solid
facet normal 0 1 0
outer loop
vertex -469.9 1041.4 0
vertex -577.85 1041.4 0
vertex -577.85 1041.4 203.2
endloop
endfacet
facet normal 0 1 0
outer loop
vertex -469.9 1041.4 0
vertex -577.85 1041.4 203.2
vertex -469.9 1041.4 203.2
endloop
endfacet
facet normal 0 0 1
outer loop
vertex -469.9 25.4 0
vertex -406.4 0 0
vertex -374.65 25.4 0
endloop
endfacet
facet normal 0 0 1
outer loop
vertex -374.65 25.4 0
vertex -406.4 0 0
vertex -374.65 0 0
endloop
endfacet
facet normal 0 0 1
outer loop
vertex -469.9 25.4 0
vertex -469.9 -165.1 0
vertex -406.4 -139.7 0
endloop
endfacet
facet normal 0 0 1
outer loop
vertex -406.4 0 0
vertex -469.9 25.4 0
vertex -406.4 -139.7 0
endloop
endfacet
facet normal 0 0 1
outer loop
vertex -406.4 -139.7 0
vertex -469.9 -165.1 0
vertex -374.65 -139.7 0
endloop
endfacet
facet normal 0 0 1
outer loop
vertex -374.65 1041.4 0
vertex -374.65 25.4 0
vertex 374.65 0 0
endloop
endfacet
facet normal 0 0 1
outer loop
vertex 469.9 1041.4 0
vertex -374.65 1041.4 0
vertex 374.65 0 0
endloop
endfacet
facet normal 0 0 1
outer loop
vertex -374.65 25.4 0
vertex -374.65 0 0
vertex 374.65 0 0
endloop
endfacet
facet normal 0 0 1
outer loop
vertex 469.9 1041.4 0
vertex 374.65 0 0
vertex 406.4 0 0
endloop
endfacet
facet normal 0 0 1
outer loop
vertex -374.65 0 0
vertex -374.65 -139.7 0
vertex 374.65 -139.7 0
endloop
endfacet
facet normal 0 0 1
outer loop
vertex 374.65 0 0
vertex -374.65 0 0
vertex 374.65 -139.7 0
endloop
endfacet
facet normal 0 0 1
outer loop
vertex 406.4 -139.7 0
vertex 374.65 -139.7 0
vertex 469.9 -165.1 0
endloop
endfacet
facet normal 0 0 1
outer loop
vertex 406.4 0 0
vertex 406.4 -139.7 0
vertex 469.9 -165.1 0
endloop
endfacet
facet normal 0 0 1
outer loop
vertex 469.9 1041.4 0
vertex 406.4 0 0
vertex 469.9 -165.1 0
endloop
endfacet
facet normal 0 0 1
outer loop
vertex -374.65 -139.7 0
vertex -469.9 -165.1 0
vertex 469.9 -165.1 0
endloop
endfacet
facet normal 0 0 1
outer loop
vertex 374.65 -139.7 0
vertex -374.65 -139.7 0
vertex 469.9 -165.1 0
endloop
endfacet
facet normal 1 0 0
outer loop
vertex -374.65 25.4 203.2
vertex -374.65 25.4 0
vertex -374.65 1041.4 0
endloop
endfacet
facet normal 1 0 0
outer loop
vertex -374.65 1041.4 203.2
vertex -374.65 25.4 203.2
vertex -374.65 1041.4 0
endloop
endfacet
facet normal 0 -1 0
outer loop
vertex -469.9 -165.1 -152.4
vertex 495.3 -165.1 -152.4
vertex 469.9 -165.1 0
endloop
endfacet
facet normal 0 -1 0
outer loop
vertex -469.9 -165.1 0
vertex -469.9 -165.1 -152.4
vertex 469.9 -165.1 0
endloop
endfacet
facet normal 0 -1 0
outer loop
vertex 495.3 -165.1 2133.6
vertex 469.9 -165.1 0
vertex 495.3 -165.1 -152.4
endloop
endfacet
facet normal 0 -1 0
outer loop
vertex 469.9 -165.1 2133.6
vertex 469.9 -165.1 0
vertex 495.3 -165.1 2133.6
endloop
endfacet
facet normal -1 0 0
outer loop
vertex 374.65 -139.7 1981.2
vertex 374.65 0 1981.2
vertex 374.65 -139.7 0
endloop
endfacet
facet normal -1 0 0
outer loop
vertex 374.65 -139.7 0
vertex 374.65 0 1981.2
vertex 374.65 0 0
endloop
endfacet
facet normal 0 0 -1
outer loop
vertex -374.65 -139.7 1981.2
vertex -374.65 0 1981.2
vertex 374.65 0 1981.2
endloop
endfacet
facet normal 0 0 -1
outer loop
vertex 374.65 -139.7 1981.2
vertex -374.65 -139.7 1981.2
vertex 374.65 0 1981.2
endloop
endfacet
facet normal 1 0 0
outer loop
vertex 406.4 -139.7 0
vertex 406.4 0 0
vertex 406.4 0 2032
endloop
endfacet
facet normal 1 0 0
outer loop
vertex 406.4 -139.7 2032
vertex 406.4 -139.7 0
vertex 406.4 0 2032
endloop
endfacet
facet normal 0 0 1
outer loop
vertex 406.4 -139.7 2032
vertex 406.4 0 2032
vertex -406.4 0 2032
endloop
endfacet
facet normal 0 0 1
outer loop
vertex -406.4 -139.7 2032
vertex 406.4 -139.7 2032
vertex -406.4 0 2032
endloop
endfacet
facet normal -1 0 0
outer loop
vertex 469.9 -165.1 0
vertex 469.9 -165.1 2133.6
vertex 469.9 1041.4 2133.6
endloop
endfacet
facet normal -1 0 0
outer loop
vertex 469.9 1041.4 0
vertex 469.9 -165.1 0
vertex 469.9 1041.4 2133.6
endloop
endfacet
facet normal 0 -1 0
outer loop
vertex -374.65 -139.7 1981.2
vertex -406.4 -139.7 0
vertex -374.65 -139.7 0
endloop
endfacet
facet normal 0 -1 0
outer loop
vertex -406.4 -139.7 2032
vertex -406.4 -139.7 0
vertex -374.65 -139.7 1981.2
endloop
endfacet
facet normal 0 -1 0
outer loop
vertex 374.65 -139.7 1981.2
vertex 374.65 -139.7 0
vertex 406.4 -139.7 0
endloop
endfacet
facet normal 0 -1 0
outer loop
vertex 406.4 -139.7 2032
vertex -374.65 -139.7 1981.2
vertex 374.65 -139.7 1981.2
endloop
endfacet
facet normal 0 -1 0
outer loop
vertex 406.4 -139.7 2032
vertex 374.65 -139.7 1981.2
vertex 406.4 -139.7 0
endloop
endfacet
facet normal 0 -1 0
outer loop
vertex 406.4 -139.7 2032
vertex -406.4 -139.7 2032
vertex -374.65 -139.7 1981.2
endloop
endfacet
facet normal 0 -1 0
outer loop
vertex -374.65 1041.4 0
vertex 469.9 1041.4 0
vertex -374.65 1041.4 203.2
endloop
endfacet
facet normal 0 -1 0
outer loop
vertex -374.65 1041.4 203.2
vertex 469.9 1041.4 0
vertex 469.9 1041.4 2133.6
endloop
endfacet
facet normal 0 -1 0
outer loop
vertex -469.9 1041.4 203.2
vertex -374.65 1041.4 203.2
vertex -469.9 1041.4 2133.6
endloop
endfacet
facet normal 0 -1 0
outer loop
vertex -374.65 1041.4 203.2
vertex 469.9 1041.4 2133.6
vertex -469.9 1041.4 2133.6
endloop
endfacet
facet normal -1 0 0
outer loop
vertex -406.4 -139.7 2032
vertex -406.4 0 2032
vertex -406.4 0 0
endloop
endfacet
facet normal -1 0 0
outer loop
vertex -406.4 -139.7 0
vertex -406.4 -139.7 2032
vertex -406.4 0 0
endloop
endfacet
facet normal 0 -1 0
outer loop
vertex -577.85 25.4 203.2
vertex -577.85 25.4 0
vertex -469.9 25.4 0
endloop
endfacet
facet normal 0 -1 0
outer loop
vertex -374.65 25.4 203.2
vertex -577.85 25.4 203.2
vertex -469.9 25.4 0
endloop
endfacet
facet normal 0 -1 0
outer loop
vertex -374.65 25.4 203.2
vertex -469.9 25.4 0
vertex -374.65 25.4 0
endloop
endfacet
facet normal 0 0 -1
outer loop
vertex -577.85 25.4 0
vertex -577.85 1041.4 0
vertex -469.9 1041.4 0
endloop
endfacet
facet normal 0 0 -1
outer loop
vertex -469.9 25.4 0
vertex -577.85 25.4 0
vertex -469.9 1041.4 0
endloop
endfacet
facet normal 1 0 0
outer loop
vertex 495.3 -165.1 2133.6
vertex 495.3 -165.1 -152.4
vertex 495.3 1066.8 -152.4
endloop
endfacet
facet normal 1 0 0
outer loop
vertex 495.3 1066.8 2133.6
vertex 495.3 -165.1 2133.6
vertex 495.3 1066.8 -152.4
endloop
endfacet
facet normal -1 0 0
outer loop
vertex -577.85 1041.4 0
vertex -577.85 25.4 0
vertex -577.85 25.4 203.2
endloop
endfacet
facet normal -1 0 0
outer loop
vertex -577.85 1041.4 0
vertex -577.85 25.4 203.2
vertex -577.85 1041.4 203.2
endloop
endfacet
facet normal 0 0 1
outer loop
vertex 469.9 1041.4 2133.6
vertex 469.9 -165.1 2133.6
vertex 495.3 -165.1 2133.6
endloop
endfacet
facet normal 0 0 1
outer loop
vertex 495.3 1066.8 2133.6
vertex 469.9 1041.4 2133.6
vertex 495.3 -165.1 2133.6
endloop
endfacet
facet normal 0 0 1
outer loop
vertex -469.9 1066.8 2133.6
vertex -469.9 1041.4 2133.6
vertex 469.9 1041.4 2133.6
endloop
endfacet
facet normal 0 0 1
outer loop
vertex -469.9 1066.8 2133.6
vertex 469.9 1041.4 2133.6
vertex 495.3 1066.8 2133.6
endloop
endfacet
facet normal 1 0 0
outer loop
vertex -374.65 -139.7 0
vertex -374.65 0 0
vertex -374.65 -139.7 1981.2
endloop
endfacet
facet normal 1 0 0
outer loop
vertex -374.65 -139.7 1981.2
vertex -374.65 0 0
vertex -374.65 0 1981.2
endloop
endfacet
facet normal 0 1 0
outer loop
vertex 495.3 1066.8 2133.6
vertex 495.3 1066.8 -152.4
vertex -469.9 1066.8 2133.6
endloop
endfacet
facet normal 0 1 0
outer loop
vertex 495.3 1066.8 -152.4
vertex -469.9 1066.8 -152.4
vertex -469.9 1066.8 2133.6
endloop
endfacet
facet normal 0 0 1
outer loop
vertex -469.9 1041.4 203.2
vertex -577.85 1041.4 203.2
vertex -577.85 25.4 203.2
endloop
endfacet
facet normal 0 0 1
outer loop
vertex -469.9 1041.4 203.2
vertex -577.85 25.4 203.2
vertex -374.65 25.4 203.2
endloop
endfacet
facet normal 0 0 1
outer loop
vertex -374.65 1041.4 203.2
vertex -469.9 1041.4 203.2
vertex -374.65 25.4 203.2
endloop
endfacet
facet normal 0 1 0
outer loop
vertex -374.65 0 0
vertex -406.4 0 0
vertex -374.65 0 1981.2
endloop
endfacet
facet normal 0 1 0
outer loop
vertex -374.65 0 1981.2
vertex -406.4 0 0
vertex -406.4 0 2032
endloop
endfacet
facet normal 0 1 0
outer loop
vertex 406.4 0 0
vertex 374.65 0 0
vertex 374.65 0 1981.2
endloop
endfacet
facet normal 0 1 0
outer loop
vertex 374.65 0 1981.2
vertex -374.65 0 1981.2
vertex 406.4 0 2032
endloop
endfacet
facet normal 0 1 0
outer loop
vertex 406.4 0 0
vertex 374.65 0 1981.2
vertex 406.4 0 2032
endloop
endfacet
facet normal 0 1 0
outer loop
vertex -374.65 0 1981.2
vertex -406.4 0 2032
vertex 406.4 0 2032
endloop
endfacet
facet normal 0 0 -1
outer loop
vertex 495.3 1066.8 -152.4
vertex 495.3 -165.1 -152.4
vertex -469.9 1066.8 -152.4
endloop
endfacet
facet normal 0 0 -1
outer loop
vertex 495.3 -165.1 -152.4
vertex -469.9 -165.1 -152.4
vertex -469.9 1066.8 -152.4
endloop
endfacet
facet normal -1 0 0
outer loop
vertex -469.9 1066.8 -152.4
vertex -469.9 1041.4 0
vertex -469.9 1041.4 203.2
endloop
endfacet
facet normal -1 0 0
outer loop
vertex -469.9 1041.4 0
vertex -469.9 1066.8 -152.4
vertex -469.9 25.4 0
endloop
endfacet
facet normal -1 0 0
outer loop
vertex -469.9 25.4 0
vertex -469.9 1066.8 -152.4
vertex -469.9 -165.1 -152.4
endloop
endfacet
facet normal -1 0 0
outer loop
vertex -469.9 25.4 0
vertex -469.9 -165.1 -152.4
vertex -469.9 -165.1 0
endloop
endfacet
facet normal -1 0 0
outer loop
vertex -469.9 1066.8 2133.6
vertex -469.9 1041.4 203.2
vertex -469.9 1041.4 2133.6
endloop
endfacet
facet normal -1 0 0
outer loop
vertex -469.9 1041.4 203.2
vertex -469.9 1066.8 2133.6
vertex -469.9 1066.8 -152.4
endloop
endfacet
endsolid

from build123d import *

# Parameters (mm, degrees)
F1_DEPTH = 139.7
F2_W     = 939.8
F2_H     = 1206.5
F3_DEPTH = 152.4
F4_W     = 939.8
F4_H     = 2286
F5_DEPTH = 25.4
F6_W     = 1231.9
F6_H     = 2286
F7_DEPTH = 25.4
F8_W     = 203.2
F8_H     = 1016
F9_DEPTH = 203.2


with BuildPart() as f1:
    # F0 (on Front) → F1 (new body)
    with BuildSketch(Plane.XZ):
        Polygon((-374.65, 0), (-374.65, 1981.2), (374.65, 1981.2), (374.65, 0), (406.4, 0), (406.4, 2032), (-406.4, 2032), (-406.4, 0), align=None)
    extrude(amount=F1_DEPTH)

    # F2 (on face) → F3 (join)
    with BuildSketch(Plane(origin=(0, 0, 0), x_dir=(1, 0, 0), z_dir=(0, 0, -1))):
        with Locations((0, -438.15)):
            Rectangle(F2_W, F2_H)
    extrude(amount=F3_DEPTH)

    # F4 (on face) → F5 (join)
    with BuildSketch(Plane(origin=(0, 1041.4, 0), x_dir=(-1, 0, 0), z_dir=(0, 1, 0))):
        with Locations((0, 990.6)):
            Rectangle(F4_W, F4_H)
    extrude(amount=F5_DEPTH)

    # F6 (on face) → F7 (join)
    with BuildSketch(Plane.YZ.offset(469.9)):
        with Locations((450.85, 990.6)):
            Rectangle(F6_W, F6_H)
    extrude(amount=F7_DEPTH)

    # F8 (on face) → F9 (join)
    with BuildSketch(Plane.XY):
        with Locations((-476.25, 533.4)):
            Rectangle(F8_W, F8_H)
    extrude(amount=F9_DEPTH)


solid = f1.part
